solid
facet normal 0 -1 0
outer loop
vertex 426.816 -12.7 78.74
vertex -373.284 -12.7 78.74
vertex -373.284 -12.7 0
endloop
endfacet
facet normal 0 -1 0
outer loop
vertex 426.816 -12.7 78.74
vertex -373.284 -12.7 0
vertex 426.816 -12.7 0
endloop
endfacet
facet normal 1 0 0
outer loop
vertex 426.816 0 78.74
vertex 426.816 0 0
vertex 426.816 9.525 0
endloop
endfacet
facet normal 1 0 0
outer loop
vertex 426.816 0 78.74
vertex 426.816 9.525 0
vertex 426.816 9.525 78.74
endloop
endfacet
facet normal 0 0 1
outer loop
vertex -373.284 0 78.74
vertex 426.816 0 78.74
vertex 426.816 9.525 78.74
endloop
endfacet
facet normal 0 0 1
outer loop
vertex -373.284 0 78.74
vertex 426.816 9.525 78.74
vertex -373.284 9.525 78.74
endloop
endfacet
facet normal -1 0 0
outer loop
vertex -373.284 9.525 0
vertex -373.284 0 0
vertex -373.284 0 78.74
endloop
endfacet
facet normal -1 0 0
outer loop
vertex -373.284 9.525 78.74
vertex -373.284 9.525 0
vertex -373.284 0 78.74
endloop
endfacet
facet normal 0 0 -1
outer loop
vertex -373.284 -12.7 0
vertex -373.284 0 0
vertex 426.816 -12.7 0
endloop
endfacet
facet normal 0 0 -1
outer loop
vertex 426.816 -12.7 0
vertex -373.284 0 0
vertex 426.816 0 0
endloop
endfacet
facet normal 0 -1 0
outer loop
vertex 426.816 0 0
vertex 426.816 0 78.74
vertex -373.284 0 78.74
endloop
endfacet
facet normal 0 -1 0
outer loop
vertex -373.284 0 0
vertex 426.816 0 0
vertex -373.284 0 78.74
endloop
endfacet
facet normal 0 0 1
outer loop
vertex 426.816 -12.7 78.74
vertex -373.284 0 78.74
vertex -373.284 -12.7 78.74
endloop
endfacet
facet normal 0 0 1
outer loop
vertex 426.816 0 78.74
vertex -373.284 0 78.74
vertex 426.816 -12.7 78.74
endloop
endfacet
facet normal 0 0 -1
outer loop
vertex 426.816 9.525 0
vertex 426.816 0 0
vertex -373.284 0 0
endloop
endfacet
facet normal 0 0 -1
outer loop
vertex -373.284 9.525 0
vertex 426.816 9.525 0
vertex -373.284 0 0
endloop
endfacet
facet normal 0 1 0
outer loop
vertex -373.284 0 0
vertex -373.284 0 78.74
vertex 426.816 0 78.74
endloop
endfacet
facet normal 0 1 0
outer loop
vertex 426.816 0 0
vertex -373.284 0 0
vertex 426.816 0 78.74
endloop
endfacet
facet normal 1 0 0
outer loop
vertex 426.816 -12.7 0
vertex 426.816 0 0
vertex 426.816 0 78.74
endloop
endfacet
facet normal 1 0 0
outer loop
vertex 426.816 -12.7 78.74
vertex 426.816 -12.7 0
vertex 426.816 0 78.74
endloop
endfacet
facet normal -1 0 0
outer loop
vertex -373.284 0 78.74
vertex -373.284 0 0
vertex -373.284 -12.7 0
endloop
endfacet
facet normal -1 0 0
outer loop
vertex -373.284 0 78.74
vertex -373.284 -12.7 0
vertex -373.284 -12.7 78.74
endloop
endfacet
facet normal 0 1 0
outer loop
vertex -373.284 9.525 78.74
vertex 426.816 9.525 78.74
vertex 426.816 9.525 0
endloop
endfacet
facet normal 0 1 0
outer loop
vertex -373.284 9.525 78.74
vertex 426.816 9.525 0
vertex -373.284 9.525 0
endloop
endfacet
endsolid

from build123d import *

# Parameters (mm, degrees)
F0_W     = 800.1
F0_H     = 78.74
F1_DEPTH = 12.7
F2_W     = 800.1
F2_H     = 78.74
F3_DEPTH = 9.525


with BuildPart() as f1:
    # F0 (on Front) → F1 (new body)
    with BuildSketch(Plane.XZ):
        with Locations((26.766477, 39.37)):
            Rectangle(F0_W, F0_H)
    extrude(amount=F1_DEPTH)


with BuildPart() as f3:
    # F2 (on face) → F3 (new body)
    with BuildSketch(Plane(origin=(0, 0, 0), x_dir=(-1, 0, 0), z_dir=(0, 1, 0))):
        with Locations((-26.766477, 39.37)):
            Rectangle(F2_W, F2_H)
    extrude(amount=F3_DEPTH)


solid = Compound([f1.part, f3.part])
